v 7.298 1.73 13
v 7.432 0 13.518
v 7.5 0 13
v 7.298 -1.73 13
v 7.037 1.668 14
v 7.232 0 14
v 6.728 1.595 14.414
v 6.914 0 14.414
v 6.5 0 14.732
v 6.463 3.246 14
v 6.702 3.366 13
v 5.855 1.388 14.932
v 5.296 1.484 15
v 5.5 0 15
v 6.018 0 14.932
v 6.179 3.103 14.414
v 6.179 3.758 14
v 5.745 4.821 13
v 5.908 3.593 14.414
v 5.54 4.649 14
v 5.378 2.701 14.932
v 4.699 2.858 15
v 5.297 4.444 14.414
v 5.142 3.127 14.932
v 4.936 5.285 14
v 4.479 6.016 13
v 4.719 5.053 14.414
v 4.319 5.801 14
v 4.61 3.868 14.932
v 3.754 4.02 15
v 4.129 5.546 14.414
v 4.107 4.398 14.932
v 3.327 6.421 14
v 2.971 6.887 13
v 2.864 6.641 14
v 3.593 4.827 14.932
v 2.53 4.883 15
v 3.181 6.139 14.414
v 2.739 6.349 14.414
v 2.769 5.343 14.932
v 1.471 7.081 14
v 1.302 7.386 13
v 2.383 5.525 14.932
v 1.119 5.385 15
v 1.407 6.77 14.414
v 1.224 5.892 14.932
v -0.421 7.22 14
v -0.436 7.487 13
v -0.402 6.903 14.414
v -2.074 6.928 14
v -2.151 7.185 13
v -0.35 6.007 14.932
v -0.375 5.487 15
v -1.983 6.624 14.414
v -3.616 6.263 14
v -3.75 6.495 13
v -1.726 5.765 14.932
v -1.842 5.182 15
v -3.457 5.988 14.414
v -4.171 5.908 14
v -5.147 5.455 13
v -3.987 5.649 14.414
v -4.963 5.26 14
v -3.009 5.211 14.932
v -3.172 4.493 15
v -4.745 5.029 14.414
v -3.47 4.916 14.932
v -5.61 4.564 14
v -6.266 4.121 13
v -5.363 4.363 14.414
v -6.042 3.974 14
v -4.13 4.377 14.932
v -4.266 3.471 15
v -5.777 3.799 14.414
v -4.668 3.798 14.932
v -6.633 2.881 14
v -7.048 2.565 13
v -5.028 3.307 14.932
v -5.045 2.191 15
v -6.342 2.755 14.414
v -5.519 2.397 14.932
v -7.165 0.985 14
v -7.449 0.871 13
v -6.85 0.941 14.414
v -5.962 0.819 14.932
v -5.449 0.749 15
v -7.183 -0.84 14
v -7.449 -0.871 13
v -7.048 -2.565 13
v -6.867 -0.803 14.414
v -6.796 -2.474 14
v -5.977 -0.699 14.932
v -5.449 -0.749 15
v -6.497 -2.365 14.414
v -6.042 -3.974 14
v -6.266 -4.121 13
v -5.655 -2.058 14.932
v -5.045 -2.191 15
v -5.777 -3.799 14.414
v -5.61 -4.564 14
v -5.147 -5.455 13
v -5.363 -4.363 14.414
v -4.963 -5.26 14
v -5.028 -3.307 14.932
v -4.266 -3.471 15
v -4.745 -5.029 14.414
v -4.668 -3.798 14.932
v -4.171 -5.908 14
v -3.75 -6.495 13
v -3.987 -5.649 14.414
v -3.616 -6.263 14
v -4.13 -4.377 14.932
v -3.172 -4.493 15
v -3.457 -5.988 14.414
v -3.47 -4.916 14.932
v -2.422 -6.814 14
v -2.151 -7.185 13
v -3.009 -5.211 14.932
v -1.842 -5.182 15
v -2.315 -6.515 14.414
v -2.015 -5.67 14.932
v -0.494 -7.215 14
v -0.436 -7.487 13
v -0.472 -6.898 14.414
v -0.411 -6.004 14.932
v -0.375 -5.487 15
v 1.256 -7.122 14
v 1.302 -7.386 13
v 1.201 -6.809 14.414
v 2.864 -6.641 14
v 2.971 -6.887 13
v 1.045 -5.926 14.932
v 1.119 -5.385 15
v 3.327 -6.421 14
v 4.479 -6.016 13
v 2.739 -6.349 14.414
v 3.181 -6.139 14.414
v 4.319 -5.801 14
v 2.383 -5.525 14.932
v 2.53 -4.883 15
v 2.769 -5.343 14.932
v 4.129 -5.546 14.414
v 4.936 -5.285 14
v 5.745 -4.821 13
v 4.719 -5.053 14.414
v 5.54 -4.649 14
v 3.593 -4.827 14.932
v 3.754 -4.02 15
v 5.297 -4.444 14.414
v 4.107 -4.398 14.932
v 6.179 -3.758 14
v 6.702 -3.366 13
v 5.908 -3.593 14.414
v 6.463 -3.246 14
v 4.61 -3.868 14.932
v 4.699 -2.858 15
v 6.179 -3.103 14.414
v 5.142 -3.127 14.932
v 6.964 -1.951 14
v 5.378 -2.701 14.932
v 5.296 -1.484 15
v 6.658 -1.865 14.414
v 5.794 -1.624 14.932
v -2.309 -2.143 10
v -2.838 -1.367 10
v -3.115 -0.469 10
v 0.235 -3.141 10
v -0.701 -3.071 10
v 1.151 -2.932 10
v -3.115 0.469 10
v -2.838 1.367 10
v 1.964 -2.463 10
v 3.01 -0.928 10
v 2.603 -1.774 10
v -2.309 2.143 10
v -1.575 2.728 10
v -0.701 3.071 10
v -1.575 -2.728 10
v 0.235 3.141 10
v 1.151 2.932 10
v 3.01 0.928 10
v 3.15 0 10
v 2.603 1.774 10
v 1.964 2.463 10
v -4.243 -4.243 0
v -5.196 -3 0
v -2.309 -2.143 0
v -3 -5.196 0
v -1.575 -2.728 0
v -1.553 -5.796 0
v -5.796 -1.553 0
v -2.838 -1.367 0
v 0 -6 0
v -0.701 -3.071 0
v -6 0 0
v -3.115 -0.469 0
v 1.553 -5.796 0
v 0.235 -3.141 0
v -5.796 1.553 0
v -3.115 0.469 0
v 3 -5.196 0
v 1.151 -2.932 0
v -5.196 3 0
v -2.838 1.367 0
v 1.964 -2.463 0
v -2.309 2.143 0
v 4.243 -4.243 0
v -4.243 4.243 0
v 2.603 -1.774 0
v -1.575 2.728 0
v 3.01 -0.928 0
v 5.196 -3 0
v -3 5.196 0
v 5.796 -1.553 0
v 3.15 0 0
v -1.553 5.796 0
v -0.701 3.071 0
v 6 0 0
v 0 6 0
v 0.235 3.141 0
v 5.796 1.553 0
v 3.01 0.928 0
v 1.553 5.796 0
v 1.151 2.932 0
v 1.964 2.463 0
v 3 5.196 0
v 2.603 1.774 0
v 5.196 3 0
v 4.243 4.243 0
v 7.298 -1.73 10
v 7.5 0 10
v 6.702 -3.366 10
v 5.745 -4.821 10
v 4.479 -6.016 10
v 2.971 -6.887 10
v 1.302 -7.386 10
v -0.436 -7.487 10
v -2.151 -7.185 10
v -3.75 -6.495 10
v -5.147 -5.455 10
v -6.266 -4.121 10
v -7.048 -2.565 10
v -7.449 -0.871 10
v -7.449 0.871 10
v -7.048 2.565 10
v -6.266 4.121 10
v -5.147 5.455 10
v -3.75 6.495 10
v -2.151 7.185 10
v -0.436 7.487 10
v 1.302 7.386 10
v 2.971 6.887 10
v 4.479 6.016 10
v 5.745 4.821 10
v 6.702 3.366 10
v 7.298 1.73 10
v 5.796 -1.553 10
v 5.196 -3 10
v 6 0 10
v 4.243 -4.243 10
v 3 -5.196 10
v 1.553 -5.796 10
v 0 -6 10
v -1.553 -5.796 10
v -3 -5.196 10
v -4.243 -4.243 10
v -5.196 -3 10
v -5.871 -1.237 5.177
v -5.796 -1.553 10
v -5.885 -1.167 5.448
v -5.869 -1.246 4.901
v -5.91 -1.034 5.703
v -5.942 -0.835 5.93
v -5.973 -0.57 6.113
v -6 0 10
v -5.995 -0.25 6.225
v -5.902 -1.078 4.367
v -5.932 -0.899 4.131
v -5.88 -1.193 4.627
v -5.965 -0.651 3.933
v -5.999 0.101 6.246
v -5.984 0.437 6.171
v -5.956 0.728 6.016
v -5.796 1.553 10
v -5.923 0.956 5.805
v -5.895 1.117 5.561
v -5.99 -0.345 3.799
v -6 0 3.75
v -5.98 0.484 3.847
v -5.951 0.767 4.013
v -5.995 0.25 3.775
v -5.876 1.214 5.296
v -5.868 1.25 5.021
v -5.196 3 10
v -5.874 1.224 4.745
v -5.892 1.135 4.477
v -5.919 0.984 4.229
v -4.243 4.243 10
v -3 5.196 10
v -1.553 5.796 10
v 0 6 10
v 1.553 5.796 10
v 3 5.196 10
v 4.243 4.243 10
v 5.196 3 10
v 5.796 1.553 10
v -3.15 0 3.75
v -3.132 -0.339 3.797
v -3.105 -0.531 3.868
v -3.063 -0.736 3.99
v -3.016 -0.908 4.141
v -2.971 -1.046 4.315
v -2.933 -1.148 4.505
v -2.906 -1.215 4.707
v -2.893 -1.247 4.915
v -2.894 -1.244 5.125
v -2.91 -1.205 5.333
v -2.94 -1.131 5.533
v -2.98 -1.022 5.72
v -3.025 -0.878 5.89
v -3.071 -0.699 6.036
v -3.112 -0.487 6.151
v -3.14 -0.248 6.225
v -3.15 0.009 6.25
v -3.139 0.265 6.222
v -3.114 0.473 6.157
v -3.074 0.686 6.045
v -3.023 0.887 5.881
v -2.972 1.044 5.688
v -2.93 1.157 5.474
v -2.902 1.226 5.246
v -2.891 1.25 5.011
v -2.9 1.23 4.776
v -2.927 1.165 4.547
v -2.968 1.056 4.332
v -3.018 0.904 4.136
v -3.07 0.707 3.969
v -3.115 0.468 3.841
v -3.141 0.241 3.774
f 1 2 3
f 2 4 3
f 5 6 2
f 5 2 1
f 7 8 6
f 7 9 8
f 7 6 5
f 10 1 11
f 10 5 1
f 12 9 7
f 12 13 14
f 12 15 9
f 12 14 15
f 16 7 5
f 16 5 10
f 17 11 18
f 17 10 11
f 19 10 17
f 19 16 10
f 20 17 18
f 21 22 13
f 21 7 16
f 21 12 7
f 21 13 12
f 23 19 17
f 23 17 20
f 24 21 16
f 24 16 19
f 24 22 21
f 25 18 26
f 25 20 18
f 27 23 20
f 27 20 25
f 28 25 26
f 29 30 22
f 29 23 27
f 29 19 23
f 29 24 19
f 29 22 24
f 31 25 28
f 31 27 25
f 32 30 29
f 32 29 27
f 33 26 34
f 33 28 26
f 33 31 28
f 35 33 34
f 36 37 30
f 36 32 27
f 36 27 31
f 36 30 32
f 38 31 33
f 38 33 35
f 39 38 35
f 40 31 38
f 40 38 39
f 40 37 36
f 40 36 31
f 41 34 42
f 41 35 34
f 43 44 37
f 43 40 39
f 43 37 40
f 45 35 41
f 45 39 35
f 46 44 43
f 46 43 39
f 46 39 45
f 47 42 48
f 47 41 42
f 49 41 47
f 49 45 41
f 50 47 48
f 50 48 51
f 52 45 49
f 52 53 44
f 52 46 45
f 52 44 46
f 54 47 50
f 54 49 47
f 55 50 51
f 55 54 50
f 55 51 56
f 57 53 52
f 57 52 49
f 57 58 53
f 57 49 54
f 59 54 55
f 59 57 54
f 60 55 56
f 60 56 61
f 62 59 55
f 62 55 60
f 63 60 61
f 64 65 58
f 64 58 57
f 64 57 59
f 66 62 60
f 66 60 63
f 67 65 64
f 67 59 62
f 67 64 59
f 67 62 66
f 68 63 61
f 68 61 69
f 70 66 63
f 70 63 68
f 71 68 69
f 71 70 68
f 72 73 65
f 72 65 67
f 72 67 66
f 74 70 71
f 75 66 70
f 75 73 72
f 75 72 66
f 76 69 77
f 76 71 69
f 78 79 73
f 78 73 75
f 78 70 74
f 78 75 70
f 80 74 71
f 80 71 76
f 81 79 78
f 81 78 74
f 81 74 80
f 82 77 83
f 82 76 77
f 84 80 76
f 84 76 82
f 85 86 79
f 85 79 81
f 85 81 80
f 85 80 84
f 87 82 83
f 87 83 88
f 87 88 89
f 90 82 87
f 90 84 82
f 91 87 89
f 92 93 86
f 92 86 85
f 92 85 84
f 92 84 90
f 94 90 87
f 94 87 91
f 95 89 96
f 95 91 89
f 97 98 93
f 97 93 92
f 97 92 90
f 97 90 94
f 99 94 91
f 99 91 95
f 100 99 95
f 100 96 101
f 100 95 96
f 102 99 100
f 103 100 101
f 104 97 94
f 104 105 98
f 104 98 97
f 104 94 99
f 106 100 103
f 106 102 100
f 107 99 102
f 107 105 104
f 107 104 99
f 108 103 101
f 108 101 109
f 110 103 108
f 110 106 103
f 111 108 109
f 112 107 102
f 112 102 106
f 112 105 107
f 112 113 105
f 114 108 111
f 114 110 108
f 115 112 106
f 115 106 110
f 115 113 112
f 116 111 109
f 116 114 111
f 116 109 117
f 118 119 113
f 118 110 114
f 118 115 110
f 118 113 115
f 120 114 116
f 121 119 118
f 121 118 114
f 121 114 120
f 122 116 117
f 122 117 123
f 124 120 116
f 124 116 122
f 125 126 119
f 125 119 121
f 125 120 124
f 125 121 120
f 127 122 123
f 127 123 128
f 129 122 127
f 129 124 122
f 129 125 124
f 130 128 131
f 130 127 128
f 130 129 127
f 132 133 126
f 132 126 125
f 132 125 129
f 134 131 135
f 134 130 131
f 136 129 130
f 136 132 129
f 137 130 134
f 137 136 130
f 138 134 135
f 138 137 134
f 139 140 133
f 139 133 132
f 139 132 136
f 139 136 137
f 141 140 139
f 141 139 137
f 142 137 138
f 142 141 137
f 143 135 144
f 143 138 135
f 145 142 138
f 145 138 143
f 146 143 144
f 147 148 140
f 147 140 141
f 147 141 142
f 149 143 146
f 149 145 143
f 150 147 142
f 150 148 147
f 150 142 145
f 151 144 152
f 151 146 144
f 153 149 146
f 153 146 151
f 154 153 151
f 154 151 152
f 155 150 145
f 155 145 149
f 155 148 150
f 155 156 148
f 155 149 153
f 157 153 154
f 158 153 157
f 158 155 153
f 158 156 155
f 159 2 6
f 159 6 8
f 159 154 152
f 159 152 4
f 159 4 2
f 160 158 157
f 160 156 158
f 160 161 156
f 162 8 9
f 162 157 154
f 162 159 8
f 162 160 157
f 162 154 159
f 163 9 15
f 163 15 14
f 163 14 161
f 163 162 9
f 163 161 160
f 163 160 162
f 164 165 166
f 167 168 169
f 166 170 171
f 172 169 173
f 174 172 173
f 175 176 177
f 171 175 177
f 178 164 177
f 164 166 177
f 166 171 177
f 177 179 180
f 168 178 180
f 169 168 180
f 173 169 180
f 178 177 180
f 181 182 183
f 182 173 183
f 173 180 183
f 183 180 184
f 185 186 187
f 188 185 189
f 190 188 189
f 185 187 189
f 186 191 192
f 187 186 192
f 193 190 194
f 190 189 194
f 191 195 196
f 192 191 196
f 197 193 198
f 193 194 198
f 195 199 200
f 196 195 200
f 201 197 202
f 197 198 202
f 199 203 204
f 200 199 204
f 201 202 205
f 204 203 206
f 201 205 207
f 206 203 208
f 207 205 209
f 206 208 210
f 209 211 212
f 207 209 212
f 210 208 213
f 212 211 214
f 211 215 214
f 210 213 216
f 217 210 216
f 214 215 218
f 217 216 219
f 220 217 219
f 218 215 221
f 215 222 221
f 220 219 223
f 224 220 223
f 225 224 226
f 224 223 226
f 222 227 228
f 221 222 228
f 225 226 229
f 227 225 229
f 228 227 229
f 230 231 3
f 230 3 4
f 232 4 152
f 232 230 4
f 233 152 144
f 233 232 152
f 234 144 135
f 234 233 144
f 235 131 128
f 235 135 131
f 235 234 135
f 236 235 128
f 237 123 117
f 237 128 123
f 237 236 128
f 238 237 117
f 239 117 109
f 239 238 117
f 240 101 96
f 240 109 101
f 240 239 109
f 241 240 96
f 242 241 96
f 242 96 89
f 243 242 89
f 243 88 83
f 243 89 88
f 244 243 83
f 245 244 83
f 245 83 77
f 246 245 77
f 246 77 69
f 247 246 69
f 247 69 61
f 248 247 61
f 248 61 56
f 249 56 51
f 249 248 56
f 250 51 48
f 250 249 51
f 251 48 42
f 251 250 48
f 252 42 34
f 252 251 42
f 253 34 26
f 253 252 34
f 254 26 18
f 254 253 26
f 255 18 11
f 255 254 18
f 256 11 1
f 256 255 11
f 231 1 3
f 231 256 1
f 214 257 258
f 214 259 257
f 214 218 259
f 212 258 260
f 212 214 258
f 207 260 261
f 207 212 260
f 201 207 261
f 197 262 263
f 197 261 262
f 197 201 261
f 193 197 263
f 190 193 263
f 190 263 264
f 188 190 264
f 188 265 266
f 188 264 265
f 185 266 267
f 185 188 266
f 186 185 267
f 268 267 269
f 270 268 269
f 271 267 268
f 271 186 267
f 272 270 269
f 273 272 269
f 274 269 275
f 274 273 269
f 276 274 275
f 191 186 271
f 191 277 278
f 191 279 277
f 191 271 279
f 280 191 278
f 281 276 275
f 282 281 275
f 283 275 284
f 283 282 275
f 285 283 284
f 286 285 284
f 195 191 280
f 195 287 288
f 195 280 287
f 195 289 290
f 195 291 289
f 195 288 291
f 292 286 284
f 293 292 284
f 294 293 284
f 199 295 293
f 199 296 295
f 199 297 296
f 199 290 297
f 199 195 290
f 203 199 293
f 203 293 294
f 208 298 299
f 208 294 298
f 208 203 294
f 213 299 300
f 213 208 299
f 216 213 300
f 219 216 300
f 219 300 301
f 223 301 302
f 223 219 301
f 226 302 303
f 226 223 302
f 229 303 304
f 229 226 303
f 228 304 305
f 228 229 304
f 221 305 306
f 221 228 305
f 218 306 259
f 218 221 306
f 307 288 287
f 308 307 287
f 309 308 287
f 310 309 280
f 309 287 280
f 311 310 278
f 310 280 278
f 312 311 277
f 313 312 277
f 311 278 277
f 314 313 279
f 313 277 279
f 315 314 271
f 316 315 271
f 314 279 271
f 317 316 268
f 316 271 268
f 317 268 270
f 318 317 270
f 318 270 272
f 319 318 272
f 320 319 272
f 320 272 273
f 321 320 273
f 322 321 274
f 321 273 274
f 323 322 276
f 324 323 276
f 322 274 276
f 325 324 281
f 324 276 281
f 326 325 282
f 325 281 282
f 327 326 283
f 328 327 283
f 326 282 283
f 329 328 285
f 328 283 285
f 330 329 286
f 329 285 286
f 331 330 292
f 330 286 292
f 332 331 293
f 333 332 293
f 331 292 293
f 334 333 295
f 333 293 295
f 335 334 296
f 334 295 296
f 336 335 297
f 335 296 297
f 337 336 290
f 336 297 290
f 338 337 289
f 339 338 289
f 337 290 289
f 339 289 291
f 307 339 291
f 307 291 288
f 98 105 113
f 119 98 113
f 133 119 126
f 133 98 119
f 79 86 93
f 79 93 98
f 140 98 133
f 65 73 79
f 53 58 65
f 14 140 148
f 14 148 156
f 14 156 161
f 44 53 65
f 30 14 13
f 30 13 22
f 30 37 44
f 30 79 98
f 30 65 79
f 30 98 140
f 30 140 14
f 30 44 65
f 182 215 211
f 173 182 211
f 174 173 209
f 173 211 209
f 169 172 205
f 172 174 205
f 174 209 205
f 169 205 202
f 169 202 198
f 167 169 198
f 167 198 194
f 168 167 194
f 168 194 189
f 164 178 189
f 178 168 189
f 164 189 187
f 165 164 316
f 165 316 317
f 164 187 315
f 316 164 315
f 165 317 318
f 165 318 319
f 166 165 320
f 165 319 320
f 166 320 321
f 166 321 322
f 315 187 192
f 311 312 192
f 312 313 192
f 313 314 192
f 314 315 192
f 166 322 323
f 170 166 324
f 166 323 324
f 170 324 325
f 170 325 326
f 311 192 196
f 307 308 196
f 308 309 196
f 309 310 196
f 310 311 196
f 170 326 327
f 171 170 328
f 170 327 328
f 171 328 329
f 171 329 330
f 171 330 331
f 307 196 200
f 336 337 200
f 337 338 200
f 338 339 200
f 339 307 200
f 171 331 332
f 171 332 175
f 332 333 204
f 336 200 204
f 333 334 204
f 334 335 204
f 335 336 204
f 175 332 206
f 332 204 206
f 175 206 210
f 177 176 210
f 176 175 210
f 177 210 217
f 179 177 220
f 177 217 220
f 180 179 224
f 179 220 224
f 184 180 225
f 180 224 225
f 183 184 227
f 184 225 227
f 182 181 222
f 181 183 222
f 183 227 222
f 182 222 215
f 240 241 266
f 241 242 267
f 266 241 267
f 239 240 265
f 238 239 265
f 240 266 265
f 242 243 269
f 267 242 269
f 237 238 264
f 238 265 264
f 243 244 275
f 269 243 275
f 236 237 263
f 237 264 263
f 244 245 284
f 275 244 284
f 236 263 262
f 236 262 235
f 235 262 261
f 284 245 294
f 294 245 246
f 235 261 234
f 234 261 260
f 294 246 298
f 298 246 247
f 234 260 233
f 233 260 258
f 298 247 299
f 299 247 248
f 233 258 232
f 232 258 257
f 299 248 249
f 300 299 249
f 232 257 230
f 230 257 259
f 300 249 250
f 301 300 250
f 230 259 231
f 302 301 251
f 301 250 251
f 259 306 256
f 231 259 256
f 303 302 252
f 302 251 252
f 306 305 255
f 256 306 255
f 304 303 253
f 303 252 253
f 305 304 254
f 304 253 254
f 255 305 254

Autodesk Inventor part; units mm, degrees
ref_plane "YZ Plane" through (0, 0, 0) normal (1, 0, 0) x (0, 1, 0)
ref_plane "XZ Plane" through (0, 0, 0) normal (0, 1, 0) x (-1, 0, 0)
ref_plane "XY Plane" through (0, 0, 0) normal (0, 0, 1) x (1, 0, 0)
sketch "Sketch1" plane through (0, 0, 0) normal (0, 0, 1) x (1, 0, 0)
  circle A0 centre (0, 0) radius 3.15
  circle A1 centre (0, 0) radius 6
  dimension "d0" = 6.3
  dimension "d1" = 12
extrude "Extrusion1" add sketch "Sketch1" along normal blind 10
sketch "Sketch2" plane through (0, 0, 10) normal (0, 0, 1) x (1, 0, 0)
  circle A0 centre (0, 0) radius 7.5
  dimension "d4" = 15
extrude "Extrusion2" add sketch "Sketch2" along normal blind 5
fillet "Fillet1" radius 2 1 edges at (-7.5, 0, 15)
sketch "Sketch3" plane through (0, 0, 0) normal (1, 0, 0) x (0, 1, 0)
  line L0 (6, 0) -> (-6, 0) projected
  point P0 (0, 0)
  point P1 (0, 5)
  dimension "d8" = 5
hole "Hole1" at (0, 0, 5) direction (-1, 0, 0) diameter 2.5 end through all
properties part number "10-06-012 Joistic"
